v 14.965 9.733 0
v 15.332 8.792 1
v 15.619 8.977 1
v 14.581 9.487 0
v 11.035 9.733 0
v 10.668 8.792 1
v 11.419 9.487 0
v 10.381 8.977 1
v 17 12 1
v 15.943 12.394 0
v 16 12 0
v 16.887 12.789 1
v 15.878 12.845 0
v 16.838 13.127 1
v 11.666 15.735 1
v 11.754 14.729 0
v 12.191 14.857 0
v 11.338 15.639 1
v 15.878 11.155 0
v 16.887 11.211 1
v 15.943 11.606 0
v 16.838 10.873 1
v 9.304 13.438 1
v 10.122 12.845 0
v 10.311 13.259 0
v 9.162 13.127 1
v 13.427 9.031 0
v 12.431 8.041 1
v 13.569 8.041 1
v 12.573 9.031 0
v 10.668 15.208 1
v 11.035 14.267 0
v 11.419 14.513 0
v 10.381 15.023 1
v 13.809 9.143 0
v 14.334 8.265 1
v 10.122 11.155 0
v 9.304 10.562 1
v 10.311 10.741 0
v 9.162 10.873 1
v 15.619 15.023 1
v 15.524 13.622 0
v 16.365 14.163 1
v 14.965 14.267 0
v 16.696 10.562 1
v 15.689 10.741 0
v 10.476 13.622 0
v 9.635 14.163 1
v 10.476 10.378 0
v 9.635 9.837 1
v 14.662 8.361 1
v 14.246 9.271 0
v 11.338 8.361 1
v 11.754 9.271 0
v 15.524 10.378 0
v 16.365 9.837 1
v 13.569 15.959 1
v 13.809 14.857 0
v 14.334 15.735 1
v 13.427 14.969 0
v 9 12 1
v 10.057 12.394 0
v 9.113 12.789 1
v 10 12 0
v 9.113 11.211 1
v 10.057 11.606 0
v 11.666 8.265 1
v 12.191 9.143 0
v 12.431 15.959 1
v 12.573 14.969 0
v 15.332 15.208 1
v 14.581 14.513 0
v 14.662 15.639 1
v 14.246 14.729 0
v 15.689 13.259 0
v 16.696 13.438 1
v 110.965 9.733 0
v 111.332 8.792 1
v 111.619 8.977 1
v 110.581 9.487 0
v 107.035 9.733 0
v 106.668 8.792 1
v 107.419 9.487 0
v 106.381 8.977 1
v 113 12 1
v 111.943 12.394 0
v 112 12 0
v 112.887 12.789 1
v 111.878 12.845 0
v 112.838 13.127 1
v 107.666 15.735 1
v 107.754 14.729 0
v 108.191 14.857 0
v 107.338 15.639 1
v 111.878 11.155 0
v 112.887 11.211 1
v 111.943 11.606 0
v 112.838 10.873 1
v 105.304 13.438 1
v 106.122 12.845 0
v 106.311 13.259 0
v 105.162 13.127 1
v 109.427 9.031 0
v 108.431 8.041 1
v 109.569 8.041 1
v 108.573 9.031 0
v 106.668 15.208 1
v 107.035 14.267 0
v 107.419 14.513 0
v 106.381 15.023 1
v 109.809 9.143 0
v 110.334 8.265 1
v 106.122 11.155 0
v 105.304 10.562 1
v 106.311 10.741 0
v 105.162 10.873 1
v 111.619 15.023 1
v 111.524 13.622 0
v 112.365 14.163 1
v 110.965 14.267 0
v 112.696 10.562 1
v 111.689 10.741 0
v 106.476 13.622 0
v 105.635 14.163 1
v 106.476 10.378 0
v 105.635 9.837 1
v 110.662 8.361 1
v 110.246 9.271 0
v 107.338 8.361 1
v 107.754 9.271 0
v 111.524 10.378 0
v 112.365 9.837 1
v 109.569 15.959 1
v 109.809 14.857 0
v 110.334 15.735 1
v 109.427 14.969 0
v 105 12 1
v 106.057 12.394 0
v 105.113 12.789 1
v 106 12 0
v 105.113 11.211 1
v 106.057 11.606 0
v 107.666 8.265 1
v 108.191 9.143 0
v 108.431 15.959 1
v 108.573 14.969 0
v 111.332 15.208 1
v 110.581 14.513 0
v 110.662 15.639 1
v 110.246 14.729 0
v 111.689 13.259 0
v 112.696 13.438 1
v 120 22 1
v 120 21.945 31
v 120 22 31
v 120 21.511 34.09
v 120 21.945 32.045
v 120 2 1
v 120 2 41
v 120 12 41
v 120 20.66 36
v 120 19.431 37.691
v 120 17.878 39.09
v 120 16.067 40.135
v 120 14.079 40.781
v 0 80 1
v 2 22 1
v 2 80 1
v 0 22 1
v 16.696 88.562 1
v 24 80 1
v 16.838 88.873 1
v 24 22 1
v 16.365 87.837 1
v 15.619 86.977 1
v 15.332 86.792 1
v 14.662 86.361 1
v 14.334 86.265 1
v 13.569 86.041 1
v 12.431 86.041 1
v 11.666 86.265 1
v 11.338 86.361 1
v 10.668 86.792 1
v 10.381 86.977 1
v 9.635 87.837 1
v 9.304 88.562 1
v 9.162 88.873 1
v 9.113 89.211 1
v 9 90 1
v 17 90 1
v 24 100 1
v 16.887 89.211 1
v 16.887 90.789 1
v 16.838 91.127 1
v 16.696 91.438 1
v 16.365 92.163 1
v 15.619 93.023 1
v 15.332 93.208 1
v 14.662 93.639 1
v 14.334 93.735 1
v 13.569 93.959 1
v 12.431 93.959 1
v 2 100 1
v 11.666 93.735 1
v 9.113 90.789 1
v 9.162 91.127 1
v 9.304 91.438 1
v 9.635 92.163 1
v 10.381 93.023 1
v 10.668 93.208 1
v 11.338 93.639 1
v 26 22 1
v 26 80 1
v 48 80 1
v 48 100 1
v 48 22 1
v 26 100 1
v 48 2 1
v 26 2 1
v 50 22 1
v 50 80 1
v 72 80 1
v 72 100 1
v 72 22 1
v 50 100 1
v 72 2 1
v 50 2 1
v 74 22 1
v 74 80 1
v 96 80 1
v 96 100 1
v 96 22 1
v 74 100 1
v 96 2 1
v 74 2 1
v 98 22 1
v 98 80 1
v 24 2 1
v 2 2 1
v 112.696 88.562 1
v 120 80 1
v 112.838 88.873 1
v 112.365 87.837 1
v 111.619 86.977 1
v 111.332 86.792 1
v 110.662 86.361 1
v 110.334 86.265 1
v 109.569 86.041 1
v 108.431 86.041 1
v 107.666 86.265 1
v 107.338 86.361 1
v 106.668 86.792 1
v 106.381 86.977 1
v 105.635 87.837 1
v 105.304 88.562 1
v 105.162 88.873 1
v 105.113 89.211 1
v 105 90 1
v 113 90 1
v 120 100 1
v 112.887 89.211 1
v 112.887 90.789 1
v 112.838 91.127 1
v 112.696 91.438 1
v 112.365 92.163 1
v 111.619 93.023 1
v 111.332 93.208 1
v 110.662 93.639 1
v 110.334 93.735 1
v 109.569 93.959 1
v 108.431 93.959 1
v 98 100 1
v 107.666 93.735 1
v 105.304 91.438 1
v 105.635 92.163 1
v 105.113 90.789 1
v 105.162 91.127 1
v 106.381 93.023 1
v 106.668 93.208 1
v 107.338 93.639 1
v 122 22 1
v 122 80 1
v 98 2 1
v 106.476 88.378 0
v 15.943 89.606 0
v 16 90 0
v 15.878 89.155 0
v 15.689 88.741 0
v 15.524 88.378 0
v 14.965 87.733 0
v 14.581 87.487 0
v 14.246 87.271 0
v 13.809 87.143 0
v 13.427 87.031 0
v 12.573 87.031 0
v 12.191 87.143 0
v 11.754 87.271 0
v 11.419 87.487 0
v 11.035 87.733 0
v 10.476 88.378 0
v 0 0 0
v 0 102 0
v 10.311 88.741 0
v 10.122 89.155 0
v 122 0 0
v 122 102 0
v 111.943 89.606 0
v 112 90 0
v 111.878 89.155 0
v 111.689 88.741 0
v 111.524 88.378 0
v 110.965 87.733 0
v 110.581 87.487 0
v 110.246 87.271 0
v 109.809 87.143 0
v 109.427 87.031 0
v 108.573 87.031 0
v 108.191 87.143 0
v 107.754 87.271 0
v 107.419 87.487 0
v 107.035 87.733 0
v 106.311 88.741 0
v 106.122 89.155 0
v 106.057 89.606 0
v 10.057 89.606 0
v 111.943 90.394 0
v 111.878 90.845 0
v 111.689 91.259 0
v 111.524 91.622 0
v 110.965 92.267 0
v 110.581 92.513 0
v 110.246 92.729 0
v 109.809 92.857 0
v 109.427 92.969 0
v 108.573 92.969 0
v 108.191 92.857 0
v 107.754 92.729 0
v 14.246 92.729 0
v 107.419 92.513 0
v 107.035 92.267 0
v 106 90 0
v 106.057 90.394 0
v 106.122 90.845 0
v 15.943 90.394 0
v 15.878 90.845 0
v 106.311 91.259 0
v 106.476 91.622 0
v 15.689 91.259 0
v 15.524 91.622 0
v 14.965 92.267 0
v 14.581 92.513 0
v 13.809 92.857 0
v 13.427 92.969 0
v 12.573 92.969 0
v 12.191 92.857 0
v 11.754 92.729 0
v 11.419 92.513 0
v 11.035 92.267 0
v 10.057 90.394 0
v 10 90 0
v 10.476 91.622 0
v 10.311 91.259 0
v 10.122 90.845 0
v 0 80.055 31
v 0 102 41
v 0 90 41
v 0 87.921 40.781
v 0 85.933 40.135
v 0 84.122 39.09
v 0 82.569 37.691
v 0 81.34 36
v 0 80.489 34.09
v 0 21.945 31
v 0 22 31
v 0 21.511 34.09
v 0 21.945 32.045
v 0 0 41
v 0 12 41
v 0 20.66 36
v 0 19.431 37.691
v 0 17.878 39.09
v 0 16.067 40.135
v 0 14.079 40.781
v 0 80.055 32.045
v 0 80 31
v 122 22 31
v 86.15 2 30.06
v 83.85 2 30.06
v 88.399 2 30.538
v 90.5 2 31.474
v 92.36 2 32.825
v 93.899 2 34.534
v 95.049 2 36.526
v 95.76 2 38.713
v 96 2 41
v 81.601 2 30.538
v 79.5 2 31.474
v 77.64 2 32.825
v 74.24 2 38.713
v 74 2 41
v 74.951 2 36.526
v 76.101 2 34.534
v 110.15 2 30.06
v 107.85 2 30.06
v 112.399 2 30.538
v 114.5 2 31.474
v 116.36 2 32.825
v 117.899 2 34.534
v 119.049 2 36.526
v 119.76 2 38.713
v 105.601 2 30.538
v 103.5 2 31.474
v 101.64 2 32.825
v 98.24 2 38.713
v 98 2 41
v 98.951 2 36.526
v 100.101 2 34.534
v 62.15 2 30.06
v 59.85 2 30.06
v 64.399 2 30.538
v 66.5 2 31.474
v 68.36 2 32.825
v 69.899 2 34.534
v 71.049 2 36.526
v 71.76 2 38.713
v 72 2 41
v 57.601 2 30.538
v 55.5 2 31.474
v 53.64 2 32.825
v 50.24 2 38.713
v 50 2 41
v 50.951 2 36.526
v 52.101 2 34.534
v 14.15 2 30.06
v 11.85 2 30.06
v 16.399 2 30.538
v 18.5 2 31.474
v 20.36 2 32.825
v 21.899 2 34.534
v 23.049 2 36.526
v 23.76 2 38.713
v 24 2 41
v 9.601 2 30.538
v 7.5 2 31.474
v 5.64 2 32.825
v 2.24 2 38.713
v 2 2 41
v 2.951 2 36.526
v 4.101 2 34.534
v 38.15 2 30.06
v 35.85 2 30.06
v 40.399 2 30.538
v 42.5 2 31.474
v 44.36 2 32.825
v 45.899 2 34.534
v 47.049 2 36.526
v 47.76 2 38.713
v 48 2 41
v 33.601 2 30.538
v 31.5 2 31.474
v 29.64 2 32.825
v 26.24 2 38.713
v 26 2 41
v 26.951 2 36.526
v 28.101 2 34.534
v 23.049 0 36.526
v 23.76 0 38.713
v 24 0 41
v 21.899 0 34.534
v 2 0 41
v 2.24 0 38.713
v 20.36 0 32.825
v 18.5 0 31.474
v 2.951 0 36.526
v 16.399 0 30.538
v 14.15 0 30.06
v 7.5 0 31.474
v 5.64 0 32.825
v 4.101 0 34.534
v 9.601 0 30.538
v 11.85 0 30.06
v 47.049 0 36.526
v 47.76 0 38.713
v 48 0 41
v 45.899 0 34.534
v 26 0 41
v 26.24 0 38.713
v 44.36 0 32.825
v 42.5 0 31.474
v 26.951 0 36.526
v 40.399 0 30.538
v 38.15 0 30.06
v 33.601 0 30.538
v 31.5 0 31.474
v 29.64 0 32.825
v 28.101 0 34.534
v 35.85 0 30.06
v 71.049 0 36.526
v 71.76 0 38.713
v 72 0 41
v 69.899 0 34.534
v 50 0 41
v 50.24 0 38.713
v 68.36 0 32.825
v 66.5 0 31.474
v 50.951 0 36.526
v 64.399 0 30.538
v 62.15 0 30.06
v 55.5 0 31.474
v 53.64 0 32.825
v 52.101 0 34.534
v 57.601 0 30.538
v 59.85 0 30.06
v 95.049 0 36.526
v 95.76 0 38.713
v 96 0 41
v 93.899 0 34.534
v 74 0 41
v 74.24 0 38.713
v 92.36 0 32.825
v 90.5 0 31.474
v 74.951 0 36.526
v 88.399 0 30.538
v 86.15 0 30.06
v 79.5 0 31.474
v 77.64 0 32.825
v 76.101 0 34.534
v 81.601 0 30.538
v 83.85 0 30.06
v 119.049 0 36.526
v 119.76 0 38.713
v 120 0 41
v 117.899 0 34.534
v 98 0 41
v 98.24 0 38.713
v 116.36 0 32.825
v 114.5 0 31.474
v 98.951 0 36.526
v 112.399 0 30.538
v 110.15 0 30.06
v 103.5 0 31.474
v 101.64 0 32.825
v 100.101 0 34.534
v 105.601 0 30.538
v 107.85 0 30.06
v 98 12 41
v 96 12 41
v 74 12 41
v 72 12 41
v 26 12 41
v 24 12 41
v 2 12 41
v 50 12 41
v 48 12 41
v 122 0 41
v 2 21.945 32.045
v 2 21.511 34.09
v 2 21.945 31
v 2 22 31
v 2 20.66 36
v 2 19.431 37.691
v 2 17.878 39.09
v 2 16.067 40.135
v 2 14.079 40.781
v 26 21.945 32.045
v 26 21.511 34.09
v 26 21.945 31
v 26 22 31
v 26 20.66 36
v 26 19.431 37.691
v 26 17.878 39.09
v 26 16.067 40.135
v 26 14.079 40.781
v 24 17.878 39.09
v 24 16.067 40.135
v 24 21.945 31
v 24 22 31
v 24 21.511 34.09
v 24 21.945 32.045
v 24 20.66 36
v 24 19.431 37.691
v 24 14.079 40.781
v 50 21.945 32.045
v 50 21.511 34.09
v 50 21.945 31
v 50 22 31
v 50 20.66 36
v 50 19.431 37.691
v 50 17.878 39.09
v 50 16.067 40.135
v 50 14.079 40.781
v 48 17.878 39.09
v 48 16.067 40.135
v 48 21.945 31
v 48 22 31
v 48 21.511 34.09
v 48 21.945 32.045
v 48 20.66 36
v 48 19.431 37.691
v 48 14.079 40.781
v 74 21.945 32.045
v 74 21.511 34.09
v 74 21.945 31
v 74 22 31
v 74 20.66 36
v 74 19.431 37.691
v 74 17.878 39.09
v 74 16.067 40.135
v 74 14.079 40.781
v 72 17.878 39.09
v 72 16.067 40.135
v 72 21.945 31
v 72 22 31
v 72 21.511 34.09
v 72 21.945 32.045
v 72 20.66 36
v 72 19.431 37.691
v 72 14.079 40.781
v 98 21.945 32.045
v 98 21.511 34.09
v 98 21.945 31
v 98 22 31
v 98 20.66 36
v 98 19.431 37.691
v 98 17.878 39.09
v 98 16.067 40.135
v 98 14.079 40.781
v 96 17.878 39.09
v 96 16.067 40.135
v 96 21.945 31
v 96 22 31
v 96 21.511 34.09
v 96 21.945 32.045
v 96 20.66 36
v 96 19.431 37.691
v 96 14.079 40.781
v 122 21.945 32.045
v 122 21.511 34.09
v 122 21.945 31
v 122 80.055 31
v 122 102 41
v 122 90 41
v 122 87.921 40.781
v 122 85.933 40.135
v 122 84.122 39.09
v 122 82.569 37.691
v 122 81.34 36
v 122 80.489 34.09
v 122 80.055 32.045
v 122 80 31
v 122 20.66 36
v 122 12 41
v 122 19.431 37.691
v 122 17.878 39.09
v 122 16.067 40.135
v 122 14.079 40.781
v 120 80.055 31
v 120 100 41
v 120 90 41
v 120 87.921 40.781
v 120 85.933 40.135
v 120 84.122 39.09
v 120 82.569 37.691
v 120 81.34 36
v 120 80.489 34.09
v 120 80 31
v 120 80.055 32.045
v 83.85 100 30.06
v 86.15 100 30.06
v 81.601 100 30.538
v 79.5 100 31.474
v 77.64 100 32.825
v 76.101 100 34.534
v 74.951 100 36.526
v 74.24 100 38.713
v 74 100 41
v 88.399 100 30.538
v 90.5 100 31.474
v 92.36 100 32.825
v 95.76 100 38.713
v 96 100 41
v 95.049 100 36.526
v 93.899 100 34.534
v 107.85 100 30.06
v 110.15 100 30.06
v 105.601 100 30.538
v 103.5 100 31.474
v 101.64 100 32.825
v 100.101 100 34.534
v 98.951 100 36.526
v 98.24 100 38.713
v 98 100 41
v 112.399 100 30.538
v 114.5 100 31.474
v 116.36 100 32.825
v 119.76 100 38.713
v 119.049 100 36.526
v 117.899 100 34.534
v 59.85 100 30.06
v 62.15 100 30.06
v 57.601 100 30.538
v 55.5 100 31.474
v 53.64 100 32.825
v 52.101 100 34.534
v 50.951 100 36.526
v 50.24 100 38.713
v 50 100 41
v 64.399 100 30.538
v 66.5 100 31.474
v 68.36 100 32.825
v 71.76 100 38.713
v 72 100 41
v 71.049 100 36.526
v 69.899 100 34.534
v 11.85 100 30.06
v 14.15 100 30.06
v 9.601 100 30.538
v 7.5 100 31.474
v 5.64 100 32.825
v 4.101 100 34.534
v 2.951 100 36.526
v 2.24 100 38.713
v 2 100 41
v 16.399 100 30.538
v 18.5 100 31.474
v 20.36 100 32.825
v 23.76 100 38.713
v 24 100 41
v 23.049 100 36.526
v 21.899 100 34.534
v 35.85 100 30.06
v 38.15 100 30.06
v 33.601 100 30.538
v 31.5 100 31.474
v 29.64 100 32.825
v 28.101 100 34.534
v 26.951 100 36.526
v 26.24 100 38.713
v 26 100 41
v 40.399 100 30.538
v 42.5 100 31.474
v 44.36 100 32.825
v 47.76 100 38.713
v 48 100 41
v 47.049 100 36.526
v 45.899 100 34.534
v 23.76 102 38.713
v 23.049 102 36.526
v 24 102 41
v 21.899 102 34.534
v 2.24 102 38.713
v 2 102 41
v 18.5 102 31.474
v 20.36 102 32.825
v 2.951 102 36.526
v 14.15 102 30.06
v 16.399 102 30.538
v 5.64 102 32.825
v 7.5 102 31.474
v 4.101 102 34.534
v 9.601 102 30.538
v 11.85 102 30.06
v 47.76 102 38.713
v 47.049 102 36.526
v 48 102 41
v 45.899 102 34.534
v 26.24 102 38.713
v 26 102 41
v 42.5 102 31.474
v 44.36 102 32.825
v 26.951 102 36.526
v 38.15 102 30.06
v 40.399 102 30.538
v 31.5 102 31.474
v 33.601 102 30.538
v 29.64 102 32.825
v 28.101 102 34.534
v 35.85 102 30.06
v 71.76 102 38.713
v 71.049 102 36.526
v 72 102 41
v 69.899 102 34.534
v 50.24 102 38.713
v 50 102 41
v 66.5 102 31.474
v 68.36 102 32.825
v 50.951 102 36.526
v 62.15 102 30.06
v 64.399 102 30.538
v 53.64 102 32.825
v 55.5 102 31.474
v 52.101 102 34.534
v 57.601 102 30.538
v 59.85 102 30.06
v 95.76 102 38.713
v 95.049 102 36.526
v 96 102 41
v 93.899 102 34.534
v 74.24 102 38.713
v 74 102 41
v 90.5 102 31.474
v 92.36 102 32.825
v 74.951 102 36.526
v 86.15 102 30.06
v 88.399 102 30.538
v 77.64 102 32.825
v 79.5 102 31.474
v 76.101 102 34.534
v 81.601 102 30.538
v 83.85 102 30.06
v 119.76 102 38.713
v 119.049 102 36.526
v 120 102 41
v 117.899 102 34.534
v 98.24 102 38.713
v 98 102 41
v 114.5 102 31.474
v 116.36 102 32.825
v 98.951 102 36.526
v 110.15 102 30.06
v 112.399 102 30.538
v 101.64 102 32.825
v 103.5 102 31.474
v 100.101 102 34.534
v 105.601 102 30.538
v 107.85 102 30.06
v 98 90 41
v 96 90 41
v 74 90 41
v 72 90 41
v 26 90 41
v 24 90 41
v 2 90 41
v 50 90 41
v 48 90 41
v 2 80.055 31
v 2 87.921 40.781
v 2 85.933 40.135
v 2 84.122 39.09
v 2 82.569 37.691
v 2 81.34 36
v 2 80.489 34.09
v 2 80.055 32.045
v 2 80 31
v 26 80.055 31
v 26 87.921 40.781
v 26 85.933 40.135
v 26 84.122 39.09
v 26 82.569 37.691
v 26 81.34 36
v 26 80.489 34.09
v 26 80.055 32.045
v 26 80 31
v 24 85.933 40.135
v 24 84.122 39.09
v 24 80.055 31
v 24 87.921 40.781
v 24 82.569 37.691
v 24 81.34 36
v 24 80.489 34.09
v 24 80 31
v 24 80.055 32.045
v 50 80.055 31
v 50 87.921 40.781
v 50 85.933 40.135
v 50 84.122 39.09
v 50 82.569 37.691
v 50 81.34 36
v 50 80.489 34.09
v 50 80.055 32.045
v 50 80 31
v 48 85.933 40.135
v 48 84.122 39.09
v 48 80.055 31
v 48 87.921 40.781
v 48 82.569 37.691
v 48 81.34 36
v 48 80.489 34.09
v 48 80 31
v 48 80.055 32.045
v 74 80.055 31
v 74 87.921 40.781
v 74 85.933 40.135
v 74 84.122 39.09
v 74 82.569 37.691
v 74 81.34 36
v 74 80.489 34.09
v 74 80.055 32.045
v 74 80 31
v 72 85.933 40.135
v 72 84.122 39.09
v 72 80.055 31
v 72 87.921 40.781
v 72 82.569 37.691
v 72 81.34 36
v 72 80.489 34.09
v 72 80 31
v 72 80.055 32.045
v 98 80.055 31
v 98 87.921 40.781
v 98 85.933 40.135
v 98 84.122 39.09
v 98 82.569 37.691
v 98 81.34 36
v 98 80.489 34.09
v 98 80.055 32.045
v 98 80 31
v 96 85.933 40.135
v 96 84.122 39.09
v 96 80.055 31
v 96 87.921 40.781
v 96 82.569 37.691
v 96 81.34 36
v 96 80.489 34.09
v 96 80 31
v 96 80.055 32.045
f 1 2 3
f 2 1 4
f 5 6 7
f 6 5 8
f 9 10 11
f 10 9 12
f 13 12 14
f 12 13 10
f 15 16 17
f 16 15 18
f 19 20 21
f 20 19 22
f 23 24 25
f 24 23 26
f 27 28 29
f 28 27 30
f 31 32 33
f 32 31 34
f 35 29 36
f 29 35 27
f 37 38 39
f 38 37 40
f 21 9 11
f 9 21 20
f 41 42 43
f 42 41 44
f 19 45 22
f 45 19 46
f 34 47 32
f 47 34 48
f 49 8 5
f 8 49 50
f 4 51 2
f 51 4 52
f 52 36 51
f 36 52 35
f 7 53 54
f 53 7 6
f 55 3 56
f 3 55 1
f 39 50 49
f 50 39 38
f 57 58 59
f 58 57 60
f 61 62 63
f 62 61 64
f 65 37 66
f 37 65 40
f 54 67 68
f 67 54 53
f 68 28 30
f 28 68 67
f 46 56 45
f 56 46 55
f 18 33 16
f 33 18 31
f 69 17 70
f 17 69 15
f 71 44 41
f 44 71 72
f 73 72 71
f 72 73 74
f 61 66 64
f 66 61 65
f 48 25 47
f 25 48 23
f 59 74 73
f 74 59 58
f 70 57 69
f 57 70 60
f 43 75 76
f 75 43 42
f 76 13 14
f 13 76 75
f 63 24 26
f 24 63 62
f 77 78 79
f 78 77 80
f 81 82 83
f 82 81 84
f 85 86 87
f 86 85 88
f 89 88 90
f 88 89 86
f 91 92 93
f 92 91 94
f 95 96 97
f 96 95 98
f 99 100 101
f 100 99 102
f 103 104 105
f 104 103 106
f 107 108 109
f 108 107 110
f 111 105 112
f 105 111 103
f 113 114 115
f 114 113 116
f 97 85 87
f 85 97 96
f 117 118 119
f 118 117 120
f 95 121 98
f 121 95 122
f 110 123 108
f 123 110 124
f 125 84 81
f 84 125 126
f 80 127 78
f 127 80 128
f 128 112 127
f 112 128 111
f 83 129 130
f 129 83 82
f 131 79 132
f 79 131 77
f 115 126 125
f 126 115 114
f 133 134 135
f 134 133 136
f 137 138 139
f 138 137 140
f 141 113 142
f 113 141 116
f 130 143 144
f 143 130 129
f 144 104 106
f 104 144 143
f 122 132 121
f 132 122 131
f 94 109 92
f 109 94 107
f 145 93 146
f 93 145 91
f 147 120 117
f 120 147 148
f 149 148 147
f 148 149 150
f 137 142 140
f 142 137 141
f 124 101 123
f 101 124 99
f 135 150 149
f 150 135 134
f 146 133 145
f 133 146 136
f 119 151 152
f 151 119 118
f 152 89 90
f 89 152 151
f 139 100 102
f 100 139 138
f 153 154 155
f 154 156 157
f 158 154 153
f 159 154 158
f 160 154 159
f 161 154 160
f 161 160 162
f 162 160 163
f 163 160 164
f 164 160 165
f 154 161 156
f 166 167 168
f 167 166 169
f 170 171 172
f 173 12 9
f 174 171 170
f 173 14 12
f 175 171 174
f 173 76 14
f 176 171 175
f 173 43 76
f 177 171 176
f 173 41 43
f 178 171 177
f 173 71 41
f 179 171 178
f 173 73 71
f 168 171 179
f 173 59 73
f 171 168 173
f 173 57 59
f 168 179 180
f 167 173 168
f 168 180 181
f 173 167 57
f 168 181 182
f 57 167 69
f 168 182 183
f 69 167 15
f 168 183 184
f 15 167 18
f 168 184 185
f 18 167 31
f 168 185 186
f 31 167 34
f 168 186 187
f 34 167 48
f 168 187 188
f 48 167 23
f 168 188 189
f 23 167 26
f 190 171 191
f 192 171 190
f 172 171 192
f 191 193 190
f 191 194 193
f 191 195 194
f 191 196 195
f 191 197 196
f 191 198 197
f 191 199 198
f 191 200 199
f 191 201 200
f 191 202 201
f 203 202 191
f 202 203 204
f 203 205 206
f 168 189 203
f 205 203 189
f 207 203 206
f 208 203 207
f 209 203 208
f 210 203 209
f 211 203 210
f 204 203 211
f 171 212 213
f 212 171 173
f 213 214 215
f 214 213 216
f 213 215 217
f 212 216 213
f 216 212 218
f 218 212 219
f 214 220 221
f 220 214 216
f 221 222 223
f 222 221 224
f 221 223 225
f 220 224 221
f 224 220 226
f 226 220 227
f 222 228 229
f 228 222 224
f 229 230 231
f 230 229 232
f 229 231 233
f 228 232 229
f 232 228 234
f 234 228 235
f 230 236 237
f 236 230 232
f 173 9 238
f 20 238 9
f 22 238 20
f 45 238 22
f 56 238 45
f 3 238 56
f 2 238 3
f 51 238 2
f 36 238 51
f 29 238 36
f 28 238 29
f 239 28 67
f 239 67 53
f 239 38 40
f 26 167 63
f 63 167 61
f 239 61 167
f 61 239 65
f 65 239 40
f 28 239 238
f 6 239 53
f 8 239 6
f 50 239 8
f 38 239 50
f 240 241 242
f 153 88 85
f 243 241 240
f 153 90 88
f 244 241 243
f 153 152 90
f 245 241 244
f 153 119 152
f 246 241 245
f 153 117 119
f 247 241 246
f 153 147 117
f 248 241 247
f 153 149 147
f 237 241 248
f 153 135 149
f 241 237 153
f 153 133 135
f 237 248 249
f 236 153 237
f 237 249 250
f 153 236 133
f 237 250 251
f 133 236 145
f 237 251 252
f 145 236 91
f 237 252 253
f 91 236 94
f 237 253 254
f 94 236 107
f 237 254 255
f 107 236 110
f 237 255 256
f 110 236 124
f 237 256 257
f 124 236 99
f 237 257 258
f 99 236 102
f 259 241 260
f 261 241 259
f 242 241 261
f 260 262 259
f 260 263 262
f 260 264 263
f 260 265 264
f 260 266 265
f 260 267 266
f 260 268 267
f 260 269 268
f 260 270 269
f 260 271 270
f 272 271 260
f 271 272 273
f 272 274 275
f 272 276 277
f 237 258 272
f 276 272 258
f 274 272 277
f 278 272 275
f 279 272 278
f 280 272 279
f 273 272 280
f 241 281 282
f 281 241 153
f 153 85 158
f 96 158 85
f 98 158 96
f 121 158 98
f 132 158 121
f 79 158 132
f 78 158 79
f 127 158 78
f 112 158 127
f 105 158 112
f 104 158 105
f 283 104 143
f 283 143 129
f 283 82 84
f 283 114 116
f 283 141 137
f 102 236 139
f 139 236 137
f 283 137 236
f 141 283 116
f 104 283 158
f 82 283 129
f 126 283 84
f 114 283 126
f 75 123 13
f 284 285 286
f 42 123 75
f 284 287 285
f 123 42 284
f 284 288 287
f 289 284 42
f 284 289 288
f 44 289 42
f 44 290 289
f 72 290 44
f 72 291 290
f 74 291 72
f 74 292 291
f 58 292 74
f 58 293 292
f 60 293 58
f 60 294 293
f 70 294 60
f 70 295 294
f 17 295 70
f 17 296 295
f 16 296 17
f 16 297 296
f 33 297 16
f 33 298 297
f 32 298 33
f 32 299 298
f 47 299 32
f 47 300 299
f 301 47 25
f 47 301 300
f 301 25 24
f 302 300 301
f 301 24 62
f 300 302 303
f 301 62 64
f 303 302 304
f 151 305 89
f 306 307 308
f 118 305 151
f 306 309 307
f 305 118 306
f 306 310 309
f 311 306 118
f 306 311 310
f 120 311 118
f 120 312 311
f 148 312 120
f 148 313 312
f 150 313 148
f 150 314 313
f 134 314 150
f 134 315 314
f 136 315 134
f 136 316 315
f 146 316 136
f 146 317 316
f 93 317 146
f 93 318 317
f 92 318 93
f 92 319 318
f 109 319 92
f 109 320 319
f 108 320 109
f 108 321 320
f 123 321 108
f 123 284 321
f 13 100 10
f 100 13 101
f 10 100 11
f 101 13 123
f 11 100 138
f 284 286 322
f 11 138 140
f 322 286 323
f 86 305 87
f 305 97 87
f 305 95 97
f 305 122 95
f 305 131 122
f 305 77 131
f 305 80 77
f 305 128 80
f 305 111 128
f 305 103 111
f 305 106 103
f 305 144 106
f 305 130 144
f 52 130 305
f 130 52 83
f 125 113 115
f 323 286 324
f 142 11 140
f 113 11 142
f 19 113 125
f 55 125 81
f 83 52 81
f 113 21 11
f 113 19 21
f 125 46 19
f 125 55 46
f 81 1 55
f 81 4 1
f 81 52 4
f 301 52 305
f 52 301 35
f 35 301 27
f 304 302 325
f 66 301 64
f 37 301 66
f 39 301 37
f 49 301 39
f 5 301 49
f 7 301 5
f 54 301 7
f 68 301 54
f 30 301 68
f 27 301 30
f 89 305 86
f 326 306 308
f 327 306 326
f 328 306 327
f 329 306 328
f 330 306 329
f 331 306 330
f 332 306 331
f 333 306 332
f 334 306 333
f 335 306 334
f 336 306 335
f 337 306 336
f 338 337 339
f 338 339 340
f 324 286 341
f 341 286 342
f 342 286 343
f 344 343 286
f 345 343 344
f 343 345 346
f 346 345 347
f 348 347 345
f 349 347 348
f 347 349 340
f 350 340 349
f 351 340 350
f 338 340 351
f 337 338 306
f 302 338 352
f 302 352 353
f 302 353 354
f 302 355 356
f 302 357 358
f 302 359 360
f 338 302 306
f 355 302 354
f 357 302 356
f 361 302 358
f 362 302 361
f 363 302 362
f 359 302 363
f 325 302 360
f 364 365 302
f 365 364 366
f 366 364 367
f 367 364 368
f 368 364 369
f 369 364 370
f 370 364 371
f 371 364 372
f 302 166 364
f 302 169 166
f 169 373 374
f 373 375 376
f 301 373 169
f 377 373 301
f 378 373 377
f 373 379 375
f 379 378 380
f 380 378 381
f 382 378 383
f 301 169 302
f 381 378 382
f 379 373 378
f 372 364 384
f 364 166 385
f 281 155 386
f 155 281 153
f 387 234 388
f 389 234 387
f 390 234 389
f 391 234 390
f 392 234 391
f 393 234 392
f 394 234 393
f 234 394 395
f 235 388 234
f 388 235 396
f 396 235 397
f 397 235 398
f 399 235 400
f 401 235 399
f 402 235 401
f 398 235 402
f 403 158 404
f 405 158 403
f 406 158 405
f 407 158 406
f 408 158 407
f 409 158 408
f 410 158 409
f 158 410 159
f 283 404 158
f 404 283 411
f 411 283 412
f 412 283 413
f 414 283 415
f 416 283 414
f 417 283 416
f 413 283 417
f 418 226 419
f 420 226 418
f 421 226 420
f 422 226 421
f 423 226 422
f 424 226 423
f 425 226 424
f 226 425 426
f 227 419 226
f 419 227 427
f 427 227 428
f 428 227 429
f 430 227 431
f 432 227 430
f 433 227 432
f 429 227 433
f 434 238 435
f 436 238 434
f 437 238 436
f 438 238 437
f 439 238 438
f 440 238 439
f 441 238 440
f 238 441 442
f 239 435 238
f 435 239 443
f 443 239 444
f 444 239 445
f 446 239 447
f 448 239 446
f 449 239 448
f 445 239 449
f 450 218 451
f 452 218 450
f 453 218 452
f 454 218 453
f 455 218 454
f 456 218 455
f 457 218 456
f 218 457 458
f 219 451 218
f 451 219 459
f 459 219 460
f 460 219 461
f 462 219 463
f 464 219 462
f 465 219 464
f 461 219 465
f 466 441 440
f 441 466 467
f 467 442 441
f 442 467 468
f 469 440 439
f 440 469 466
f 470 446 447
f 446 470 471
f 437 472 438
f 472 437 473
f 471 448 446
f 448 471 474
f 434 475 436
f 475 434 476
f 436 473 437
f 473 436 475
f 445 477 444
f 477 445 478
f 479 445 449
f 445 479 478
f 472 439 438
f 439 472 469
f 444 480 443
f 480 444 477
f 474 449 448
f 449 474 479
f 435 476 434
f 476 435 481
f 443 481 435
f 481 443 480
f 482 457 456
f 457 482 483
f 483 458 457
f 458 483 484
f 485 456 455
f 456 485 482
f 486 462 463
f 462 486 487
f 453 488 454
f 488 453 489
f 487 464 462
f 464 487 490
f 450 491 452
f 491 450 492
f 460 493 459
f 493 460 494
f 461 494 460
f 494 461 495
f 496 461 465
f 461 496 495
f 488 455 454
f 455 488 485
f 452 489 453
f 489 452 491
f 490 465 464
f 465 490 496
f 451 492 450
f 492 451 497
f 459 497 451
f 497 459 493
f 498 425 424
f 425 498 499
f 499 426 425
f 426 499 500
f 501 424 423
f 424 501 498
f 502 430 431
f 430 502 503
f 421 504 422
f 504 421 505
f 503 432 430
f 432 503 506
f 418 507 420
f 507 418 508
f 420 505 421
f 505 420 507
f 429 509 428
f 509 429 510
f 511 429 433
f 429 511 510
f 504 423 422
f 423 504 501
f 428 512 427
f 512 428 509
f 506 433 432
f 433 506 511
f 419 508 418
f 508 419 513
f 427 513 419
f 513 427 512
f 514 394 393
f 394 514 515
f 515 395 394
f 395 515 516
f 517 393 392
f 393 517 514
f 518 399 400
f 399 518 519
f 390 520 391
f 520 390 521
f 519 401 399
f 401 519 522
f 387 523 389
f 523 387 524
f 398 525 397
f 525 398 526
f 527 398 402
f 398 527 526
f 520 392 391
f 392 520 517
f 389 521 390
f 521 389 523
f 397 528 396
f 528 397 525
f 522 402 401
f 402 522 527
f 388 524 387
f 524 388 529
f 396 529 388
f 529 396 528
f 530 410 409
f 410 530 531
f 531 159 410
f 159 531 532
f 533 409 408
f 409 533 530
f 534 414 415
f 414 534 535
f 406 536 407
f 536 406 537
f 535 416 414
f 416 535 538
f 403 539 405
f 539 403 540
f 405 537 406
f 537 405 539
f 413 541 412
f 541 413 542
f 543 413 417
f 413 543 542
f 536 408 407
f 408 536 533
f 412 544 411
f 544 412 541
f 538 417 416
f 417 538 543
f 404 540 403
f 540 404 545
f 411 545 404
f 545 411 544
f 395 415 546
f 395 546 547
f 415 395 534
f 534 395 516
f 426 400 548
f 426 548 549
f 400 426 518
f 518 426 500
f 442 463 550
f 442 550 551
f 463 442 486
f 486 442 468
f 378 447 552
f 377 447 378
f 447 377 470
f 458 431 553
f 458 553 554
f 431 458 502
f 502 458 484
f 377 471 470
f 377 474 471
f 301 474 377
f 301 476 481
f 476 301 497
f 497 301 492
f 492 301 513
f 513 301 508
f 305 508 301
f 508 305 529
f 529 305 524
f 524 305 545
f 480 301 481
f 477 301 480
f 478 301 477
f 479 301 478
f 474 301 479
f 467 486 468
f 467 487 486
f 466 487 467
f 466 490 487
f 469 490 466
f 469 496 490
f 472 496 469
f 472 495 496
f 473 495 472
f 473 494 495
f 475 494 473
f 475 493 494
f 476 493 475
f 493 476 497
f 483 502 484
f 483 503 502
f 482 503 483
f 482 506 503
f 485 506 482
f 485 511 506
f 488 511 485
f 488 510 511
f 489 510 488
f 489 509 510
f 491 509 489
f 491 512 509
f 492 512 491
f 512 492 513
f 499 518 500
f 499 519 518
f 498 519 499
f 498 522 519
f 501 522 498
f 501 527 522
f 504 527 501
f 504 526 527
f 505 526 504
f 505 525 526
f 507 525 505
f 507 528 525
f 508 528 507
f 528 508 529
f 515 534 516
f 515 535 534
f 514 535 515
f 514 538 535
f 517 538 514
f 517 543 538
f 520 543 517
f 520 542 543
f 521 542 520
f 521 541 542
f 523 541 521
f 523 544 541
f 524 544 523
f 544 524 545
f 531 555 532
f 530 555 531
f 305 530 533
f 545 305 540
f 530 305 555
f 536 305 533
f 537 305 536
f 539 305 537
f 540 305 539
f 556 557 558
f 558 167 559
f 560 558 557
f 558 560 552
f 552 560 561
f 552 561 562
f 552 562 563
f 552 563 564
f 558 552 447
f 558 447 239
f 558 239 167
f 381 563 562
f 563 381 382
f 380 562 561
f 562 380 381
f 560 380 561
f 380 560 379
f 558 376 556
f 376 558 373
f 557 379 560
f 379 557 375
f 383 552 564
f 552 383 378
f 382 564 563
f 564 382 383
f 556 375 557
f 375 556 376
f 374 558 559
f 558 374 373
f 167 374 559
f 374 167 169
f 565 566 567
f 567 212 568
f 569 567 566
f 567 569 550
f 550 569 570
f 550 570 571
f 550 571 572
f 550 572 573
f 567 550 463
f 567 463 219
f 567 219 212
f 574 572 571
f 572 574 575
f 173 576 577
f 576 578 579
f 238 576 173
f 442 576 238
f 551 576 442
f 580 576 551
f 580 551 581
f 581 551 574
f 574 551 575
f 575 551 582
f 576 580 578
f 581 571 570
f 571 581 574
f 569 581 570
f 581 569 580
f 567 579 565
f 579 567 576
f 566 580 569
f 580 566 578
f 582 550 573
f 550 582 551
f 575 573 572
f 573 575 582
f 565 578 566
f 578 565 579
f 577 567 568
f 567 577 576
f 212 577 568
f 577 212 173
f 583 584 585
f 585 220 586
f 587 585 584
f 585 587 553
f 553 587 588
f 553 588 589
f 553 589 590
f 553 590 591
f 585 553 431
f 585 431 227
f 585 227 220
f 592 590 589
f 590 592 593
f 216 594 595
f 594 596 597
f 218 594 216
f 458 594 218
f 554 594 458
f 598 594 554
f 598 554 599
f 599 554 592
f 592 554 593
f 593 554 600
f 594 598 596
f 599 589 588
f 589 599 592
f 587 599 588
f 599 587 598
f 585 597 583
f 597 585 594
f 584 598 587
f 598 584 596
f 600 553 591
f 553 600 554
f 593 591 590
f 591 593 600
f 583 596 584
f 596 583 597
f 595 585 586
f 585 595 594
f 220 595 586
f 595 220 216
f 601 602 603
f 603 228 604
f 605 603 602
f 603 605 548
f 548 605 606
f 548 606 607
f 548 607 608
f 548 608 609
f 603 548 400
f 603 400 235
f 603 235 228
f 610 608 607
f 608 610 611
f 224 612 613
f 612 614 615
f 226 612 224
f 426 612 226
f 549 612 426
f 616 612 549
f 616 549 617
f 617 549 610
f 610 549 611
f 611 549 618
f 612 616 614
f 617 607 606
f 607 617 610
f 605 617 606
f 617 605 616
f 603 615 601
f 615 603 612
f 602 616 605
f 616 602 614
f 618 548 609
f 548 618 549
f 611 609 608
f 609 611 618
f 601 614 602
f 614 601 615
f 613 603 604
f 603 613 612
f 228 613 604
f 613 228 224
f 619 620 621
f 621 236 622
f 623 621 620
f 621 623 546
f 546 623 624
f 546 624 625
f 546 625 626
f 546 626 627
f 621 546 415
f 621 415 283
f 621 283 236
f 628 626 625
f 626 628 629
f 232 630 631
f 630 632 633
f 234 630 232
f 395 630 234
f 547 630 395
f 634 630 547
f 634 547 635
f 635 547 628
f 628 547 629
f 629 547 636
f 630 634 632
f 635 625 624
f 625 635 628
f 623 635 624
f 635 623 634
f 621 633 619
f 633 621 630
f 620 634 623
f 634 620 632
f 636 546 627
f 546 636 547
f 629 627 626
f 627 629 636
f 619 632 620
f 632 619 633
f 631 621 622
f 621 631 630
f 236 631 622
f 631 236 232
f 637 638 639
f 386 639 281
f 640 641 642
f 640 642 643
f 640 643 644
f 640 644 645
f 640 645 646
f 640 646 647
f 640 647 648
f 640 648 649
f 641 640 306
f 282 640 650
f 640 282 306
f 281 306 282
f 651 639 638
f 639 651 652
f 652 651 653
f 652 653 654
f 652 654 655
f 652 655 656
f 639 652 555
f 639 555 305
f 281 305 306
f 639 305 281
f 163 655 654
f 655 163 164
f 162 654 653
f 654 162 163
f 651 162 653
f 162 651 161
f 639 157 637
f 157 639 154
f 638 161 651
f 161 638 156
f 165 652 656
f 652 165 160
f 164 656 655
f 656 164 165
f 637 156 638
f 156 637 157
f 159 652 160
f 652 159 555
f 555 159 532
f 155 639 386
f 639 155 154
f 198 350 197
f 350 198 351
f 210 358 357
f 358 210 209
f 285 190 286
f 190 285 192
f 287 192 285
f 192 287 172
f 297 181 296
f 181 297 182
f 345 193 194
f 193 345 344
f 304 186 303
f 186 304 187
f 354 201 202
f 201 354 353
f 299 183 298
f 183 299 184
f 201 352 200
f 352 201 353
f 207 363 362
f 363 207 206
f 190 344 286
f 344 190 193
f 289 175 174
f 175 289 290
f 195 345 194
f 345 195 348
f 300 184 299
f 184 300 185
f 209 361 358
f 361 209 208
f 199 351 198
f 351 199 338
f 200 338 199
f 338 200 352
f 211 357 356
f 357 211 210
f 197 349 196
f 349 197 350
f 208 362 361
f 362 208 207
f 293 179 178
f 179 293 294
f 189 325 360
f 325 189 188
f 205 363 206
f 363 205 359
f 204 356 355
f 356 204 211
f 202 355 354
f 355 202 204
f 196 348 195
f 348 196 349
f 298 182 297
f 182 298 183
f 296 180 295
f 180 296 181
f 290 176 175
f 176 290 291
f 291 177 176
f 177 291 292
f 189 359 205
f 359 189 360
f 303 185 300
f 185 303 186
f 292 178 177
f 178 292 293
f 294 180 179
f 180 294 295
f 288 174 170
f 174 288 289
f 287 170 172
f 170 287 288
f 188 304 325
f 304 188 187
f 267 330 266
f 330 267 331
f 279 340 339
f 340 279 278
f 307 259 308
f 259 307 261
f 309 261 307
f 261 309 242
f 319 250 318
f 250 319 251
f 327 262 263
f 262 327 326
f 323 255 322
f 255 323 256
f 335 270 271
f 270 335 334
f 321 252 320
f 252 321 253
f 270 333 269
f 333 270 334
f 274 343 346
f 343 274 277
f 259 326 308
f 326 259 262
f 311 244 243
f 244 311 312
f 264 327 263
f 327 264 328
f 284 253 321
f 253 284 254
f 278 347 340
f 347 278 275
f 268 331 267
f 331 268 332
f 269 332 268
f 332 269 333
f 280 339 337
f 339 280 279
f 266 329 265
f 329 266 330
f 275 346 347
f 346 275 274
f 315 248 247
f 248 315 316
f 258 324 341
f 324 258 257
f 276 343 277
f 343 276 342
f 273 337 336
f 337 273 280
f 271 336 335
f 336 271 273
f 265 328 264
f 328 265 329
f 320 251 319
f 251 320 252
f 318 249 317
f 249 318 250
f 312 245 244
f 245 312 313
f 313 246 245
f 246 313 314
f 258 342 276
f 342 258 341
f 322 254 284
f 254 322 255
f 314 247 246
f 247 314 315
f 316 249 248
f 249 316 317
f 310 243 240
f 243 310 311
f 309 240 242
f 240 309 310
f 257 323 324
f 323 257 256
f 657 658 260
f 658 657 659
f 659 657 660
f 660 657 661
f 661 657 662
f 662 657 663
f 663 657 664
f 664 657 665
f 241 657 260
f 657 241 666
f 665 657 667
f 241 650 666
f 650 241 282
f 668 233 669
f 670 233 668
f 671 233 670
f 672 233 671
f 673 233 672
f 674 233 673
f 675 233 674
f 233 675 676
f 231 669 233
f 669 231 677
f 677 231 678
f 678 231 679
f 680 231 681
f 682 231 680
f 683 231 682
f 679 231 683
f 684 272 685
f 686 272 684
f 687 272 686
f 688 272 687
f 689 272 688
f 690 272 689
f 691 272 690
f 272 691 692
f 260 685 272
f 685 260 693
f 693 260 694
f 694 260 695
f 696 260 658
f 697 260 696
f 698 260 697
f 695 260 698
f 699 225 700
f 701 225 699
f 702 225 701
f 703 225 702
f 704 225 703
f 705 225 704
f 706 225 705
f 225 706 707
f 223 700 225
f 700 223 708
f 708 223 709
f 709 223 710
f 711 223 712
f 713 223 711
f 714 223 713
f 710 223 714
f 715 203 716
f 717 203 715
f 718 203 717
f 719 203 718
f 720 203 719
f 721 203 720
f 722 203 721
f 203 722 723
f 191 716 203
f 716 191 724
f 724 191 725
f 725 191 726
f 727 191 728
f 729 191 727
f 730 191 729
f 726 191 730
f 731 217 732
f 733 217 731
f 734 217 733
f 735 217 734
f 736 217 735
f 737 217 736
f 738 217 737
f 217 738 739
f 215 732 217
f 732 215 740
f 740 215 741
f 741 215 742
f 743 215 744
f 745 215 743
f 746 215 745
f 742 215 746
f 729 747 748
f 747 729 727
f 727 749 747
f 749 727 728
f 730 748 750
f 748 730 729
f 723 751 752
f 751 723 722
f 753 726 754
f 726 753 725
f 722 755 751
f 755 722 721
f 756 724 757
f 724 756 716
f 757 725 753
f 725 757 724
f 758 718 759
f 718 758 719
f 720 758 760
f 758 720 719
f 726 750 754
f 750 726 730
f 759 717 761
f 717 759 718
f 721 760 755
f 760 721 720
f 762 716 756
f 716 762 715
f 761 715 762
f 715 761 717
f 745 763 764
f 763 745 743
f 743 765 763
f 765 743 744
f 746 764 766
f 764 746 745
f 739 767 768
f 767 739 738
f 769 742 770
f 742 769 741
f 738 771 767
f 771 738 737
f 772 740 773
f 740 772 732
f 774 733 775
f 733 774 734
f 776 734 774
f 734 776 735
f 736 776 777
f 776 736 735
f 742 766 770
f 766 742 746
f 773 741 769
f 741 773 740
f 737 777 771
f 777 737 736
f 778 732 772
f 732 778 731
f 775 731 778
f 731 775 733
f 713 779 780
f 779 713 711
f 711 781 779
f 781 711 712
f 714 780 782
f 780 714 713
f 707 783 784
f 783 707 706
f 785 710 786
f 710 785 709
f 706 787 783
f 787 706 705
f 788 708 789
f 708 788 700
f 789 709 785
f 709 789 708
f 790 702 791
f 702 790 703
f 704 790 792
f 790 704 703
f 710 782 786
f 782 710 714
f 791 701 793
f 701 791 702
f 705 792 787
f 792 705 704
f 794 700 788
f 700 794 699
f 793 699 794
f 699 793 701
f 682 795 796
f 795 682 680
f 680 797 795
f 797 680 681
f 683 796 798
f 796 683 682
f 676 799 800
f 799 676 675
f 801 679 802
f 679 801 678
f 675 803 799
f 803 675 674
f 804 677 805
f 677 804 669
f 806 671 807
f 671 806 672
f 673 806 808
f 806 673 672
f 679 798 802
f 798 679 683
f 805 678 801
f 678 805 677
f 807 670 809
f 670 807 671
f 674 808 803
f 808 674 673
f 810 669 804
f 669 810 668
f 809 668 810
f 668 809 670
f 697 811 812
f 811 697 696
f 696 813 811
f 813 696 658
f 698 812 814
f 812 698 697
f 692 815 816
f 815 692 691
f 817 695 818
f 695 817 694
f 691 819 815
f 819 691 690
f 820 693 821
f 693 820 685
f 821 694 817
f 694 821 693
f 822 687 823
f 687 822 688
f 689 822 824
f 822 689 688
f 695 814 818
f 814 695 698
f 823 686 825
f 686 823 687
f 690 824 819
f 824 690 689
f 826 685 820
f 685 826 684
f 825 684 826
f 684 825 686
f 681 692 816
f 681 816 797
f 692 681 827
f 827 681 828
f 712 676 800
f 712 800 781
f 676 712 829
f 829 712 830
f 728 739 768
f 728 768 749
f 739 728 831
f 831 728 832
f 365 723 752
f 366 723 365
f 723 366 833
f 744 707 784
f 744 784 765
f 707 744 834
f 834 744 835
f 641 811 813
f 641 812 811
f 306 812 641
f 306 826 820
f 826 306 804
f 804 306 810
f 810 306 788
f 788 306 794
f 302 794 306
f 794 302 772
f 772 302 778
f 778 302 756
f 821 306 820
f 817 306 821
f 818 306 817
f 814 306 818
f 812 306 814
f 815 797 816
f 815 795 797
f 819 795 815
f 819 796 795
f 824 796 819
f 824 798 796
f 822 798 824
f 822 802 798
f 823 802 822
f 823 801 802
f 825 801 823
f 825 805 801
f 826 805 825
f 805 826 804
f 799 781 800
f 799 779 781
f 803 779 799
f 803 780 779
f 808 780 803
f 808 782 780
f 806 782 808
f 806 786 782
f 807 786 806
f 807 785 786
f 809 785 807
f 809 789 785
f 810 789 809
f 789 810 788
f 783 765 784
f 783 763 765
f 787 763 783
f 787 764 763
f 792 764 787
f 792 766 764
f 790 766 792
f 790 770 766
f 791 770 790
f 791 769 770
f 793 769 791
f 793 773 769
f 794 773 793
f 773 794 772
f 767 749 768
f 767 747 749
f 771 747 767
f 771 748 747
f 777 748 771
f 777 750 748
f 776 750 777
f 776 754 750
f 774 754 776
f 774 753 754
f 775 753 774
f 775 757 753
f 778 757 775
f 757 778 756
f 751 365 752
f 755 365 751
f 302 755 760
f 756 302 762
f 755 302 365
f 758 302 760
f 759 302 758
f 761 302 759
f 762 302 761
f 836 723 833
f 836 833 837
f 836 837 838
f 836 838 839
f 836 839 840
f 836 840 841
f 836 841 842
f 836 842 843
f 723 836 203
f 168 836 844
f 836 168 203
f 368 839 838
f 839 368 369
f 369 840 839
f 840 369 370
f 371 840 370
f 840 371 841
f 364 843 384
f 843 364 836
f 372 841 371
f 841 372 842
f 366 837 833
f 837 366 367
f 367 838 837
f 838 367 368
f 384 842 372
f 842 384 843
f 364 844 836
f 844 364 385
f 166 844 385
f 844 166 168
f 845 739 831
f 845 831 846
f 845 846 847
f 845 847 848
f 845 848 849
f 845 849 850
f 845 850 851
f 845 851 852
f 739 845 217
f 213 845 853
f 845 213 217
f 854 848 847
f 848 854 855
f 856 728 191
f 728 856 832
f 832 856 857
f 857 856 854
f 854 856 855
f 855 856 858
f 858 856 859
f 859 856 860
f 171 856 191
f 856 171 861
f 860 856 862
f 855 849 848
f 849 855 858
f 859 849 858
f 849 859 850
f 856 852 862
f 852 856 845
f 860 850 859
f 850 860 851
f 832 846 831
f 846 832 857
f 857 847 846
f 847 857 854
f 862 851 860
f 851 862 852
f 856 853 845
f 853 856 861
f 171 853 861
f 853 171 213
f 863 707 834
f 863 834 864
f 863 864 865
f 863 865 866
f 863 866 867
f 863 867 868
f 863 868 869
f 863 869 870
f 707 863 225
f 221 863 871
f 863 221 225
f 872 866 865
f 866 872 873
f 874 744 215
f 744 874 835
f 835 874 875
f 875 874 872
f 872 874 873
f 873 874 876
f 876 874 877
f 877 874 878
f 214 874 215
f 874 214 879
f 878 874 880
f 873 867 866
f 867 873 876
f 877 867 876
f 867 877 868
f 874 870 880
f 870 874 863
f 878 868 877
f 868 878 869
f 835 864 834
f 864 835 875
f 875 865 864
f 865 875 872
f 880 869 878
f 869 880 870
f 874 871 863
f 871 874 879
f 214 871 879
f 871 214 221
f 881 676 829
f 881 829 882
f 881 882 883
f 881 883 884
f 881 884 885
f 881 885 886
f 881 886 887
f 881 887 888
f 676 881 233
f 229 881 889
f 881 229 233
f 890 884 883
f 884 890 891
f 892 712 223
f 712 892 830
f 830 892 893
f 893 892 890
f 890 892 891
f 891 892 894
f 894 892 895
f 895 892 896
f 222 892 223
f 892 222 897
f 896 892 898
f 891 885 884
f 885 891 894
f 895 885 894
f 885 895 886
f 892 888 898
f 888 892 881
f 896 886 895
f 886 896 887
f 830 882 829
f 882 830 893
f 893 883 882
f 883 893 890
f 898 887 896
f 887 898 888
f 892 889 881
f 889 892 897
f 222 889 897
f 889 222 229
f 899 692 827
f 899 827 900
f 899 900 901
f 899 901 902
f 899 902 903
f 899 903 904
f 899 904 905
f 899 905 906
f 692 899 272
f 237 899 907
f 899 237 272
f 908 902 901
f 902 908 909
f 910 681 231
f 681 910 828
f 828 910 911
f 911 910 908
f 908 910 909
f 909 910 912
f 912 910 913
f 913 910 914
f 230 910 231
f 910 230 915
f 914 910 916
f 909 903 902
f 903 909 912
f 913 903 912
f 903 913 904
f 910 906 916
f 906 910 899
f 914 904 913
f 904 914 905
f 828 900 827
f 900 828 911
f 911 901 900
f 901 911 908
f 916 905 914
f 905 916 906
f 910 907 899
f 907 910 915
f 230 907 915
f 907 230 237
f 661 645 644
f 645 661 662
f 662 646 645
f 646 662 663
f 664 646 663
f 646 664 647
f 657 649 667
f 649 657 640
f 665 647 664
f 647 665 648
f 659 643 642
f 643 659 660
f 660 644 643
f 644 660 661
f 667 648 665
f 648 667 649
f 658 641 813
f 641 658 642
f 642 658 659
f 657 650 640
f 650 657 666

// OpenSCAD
// [FL_INDEX: keywords="openscad, 3d_parametric, Parametric_altoids_storage_rack, csg_solid" | COT="Parametric OpenSCAD design from 3DCodeverse"]
// Title: Parametric altoids storage rack

//------------------------------------------------------------
// Parametric altoids storage racks 
//
// http://www.thingiverse.com/wardwouts
// 
//
//------------------------------------------------------------

// What type of storage do you want?
style = "fullwide"; // [full,fullwide, singleleft, singleright, middle]

// Number of tins to store
tins = 5;

// in the sides for easier tin grabbing?
cutouts = "yes"; // [yes,no]

screw_holes = "yes"; // [yes,no]

closed_ends = "no"; // [yes,no]

// For stacking multiple racks you may not want a bottom shelf
with_bottom_shelf = "yes"; // [yes,no]

// Side depth (how deep is a shelf in mm)
depth = 40;

// Side width (how wide is a shelf in mm)
width = 20;

wall_thickness = 2;
bottom_thickness = 1;

// Amount of play a tin should have at its sides
width_play = 0.5;

// Amount of play a tin should have between shelves
height_play = 0.5;

//////////////////////////////////////////////////////////////////
// Some tin measurements; these shouldn't need editing
// Thickness of an altoids tin as measured
tin_thickness = 21.5;
// as measured
tin_width = 62; 
// as measured
tin_length = 97.5;

//////////////////////////////////////////////////////////////////
// Code starts here

wtn = wall_thickness;
btn = bottom_thickness;

// the sace betwee 2 shelves
spacing = tin_thickness + height_play;

tin_tot_width = tin_width + width_play;
tin_tot_length = tin_length + width_play;

length=tins*spacing + tins*wtn;

module base() {
	// Draw the base wall thickness offset from origin
	translate([0,wtn,0]){
		if ( screw_holes == "yes"){
			difference(){
				cube([length,width,btn]);
				union() {
					translate([wtn+spacing/2,width/2,0]){
						screw_hole();
					}
					translate([length - spacing/2,width/2,0]){
						screw_hole();
					}
				}
			}
		} else {
			cube([length,width,btn]);
		}
	}
}

module side() {
	if (cutouts == "yes") {
		difference(){
			cube([length,wtn,depth+btn]);
			union(){
				for (i = [0 : tins - 1]){
					translate([wtn + (spacing/2) + (spacing+wtn)*i, -wtn, depth+btn]){
						rotate([270,0,0]){
							// if I aim for an exact cutout, some material remains,
							// so cutout 3*wtn
							cylinder(h=wtn*3,r=spacing/2);
						}
					}
				}
			}
		}
	} else {
		cube([length,wtn,depth+btn]);
	}
}

module shelf() {
	// Draws a single shelf with one rounded corner
	// To draw this it draws 2 rectangles and one cilinder like:
	// +--+-
	// |  |	 \
	// |  |+-+
	// +--++-+
	// As the circle may get to big it cuts everything off at the surrouning rectangle
	// Draw the base wall thickness and base thickness offset from origin
	translate([0,wtn,btn]){
		intersection() {
			cube([wtn,width,depth]);
			union() {
				translate([0,width/2,depth-width/2]){
					rotate([0,90,0]){
						cylinder(h=wtn, r=width/2);
					}
				}
				cube([wtn,width/2,depth]);
				translate([0,width/2,0]){
					cube([wtn,width/2,depth-width/2]);
				}
			}
		}
	}
}

module shelves() {
	// Draw the same number of shelves as there are tins
	// If with_bottom_shelf was chosen, draw one more
	for (i = [0 : tins - 1]){
		translate([(spacing+wtn)*i,0,0]){
			shelf();
		}
	}
	if (with_bottom_shelf == "yes"){
		translate([length,0,0]){
			shelf();
			// the end tray needs a bit more side and base too
			cube([wtn,wtn,btn+depth]);
			cube([wtn,width+wtn,btn]);
		}
	}
}

module spacer() {
	// If a full rack was chosen we need material to hold the two sides together
	// this module draws that bit
	if (style == "full" || style == "fullwide") {
		if (style == "full") {
			translate([0,width+wtn,0]){	
				if (with_bottom_shelf == "yes"){
					cube([length + wtn, tin_tot_width/2 - width, btn]);
				} else {
					cube([length, tin_tot_width/2 - width, btn]);
				}
			}
		} else {
			translate([0,width+wtn,0]){
				if (with_bottom_shelf == "yes"){
					cube([length + wtn, tin_tot_length/2 - width, btn]);
				} else {
					cube([length, tin_tot_length/2 - width, btn]);
				}
			}
		}
	}
}

module ends() {
	// It can be nice to have closed top and bottom shelves
	// If closed_ends have been chosen, fill up the ends
	if (closed_ends == "yes"){
		if (style == "full") {
			cube([wtn, tin_tot_width/2+wtn, depth+btn]);
		} else if (style == "fullwide") {
			cube([wtn, tin_tot_length/2+wtn, depth+btn]);
		}
		if (with_bottom_shelf == "yes"){
			translate([length,0,0]){
				if (style == "full") {
					cube([wtn, tin_tot_width/2+wtn, depth+btn]);
				} else if (style == "fullwide") {
					cube([wtn, tin_tot_length/2+wtn, depth+btn]);
				}
			}
		}
	}
}

module screw_hole() {
	// screw head that I measured maxes at 7mm
	// screw thread is 3.5 mm
	head = 7;
	thread = 3.5 + 0.5;

	translate([0,0,-20]){
		cylinder(h=30, r=thread/2, $fn=20);
	}
	translate([0,0,btn-(thread/2)]){
		cylinder(h=head-(thread/2), r1=thread/2, r2=head);
	}
}

module rack() {
	base();
	side();
	shelves();
	spacer();
	ends();
}

if (style == "singleright"){
	mirror([0,1,0]){
		rack();
	}
} else {
	rack();
}

if (style == "full") {
	translate([0, tin_tot_width+2*wtn,0]){
		mirror([0,1,0]){
			rack();
		}
	}
} else if (style == "fullwide") {
	translate([0, tin_tot_length+2*wtn,0]){
		mirror([0,1,0]){
			rack();
		}
	}
} else if (style == "middle") {
	translate([0, wtn, 0]){
		mirror([0,1,0]){
			rack();
		}
	}	
}
